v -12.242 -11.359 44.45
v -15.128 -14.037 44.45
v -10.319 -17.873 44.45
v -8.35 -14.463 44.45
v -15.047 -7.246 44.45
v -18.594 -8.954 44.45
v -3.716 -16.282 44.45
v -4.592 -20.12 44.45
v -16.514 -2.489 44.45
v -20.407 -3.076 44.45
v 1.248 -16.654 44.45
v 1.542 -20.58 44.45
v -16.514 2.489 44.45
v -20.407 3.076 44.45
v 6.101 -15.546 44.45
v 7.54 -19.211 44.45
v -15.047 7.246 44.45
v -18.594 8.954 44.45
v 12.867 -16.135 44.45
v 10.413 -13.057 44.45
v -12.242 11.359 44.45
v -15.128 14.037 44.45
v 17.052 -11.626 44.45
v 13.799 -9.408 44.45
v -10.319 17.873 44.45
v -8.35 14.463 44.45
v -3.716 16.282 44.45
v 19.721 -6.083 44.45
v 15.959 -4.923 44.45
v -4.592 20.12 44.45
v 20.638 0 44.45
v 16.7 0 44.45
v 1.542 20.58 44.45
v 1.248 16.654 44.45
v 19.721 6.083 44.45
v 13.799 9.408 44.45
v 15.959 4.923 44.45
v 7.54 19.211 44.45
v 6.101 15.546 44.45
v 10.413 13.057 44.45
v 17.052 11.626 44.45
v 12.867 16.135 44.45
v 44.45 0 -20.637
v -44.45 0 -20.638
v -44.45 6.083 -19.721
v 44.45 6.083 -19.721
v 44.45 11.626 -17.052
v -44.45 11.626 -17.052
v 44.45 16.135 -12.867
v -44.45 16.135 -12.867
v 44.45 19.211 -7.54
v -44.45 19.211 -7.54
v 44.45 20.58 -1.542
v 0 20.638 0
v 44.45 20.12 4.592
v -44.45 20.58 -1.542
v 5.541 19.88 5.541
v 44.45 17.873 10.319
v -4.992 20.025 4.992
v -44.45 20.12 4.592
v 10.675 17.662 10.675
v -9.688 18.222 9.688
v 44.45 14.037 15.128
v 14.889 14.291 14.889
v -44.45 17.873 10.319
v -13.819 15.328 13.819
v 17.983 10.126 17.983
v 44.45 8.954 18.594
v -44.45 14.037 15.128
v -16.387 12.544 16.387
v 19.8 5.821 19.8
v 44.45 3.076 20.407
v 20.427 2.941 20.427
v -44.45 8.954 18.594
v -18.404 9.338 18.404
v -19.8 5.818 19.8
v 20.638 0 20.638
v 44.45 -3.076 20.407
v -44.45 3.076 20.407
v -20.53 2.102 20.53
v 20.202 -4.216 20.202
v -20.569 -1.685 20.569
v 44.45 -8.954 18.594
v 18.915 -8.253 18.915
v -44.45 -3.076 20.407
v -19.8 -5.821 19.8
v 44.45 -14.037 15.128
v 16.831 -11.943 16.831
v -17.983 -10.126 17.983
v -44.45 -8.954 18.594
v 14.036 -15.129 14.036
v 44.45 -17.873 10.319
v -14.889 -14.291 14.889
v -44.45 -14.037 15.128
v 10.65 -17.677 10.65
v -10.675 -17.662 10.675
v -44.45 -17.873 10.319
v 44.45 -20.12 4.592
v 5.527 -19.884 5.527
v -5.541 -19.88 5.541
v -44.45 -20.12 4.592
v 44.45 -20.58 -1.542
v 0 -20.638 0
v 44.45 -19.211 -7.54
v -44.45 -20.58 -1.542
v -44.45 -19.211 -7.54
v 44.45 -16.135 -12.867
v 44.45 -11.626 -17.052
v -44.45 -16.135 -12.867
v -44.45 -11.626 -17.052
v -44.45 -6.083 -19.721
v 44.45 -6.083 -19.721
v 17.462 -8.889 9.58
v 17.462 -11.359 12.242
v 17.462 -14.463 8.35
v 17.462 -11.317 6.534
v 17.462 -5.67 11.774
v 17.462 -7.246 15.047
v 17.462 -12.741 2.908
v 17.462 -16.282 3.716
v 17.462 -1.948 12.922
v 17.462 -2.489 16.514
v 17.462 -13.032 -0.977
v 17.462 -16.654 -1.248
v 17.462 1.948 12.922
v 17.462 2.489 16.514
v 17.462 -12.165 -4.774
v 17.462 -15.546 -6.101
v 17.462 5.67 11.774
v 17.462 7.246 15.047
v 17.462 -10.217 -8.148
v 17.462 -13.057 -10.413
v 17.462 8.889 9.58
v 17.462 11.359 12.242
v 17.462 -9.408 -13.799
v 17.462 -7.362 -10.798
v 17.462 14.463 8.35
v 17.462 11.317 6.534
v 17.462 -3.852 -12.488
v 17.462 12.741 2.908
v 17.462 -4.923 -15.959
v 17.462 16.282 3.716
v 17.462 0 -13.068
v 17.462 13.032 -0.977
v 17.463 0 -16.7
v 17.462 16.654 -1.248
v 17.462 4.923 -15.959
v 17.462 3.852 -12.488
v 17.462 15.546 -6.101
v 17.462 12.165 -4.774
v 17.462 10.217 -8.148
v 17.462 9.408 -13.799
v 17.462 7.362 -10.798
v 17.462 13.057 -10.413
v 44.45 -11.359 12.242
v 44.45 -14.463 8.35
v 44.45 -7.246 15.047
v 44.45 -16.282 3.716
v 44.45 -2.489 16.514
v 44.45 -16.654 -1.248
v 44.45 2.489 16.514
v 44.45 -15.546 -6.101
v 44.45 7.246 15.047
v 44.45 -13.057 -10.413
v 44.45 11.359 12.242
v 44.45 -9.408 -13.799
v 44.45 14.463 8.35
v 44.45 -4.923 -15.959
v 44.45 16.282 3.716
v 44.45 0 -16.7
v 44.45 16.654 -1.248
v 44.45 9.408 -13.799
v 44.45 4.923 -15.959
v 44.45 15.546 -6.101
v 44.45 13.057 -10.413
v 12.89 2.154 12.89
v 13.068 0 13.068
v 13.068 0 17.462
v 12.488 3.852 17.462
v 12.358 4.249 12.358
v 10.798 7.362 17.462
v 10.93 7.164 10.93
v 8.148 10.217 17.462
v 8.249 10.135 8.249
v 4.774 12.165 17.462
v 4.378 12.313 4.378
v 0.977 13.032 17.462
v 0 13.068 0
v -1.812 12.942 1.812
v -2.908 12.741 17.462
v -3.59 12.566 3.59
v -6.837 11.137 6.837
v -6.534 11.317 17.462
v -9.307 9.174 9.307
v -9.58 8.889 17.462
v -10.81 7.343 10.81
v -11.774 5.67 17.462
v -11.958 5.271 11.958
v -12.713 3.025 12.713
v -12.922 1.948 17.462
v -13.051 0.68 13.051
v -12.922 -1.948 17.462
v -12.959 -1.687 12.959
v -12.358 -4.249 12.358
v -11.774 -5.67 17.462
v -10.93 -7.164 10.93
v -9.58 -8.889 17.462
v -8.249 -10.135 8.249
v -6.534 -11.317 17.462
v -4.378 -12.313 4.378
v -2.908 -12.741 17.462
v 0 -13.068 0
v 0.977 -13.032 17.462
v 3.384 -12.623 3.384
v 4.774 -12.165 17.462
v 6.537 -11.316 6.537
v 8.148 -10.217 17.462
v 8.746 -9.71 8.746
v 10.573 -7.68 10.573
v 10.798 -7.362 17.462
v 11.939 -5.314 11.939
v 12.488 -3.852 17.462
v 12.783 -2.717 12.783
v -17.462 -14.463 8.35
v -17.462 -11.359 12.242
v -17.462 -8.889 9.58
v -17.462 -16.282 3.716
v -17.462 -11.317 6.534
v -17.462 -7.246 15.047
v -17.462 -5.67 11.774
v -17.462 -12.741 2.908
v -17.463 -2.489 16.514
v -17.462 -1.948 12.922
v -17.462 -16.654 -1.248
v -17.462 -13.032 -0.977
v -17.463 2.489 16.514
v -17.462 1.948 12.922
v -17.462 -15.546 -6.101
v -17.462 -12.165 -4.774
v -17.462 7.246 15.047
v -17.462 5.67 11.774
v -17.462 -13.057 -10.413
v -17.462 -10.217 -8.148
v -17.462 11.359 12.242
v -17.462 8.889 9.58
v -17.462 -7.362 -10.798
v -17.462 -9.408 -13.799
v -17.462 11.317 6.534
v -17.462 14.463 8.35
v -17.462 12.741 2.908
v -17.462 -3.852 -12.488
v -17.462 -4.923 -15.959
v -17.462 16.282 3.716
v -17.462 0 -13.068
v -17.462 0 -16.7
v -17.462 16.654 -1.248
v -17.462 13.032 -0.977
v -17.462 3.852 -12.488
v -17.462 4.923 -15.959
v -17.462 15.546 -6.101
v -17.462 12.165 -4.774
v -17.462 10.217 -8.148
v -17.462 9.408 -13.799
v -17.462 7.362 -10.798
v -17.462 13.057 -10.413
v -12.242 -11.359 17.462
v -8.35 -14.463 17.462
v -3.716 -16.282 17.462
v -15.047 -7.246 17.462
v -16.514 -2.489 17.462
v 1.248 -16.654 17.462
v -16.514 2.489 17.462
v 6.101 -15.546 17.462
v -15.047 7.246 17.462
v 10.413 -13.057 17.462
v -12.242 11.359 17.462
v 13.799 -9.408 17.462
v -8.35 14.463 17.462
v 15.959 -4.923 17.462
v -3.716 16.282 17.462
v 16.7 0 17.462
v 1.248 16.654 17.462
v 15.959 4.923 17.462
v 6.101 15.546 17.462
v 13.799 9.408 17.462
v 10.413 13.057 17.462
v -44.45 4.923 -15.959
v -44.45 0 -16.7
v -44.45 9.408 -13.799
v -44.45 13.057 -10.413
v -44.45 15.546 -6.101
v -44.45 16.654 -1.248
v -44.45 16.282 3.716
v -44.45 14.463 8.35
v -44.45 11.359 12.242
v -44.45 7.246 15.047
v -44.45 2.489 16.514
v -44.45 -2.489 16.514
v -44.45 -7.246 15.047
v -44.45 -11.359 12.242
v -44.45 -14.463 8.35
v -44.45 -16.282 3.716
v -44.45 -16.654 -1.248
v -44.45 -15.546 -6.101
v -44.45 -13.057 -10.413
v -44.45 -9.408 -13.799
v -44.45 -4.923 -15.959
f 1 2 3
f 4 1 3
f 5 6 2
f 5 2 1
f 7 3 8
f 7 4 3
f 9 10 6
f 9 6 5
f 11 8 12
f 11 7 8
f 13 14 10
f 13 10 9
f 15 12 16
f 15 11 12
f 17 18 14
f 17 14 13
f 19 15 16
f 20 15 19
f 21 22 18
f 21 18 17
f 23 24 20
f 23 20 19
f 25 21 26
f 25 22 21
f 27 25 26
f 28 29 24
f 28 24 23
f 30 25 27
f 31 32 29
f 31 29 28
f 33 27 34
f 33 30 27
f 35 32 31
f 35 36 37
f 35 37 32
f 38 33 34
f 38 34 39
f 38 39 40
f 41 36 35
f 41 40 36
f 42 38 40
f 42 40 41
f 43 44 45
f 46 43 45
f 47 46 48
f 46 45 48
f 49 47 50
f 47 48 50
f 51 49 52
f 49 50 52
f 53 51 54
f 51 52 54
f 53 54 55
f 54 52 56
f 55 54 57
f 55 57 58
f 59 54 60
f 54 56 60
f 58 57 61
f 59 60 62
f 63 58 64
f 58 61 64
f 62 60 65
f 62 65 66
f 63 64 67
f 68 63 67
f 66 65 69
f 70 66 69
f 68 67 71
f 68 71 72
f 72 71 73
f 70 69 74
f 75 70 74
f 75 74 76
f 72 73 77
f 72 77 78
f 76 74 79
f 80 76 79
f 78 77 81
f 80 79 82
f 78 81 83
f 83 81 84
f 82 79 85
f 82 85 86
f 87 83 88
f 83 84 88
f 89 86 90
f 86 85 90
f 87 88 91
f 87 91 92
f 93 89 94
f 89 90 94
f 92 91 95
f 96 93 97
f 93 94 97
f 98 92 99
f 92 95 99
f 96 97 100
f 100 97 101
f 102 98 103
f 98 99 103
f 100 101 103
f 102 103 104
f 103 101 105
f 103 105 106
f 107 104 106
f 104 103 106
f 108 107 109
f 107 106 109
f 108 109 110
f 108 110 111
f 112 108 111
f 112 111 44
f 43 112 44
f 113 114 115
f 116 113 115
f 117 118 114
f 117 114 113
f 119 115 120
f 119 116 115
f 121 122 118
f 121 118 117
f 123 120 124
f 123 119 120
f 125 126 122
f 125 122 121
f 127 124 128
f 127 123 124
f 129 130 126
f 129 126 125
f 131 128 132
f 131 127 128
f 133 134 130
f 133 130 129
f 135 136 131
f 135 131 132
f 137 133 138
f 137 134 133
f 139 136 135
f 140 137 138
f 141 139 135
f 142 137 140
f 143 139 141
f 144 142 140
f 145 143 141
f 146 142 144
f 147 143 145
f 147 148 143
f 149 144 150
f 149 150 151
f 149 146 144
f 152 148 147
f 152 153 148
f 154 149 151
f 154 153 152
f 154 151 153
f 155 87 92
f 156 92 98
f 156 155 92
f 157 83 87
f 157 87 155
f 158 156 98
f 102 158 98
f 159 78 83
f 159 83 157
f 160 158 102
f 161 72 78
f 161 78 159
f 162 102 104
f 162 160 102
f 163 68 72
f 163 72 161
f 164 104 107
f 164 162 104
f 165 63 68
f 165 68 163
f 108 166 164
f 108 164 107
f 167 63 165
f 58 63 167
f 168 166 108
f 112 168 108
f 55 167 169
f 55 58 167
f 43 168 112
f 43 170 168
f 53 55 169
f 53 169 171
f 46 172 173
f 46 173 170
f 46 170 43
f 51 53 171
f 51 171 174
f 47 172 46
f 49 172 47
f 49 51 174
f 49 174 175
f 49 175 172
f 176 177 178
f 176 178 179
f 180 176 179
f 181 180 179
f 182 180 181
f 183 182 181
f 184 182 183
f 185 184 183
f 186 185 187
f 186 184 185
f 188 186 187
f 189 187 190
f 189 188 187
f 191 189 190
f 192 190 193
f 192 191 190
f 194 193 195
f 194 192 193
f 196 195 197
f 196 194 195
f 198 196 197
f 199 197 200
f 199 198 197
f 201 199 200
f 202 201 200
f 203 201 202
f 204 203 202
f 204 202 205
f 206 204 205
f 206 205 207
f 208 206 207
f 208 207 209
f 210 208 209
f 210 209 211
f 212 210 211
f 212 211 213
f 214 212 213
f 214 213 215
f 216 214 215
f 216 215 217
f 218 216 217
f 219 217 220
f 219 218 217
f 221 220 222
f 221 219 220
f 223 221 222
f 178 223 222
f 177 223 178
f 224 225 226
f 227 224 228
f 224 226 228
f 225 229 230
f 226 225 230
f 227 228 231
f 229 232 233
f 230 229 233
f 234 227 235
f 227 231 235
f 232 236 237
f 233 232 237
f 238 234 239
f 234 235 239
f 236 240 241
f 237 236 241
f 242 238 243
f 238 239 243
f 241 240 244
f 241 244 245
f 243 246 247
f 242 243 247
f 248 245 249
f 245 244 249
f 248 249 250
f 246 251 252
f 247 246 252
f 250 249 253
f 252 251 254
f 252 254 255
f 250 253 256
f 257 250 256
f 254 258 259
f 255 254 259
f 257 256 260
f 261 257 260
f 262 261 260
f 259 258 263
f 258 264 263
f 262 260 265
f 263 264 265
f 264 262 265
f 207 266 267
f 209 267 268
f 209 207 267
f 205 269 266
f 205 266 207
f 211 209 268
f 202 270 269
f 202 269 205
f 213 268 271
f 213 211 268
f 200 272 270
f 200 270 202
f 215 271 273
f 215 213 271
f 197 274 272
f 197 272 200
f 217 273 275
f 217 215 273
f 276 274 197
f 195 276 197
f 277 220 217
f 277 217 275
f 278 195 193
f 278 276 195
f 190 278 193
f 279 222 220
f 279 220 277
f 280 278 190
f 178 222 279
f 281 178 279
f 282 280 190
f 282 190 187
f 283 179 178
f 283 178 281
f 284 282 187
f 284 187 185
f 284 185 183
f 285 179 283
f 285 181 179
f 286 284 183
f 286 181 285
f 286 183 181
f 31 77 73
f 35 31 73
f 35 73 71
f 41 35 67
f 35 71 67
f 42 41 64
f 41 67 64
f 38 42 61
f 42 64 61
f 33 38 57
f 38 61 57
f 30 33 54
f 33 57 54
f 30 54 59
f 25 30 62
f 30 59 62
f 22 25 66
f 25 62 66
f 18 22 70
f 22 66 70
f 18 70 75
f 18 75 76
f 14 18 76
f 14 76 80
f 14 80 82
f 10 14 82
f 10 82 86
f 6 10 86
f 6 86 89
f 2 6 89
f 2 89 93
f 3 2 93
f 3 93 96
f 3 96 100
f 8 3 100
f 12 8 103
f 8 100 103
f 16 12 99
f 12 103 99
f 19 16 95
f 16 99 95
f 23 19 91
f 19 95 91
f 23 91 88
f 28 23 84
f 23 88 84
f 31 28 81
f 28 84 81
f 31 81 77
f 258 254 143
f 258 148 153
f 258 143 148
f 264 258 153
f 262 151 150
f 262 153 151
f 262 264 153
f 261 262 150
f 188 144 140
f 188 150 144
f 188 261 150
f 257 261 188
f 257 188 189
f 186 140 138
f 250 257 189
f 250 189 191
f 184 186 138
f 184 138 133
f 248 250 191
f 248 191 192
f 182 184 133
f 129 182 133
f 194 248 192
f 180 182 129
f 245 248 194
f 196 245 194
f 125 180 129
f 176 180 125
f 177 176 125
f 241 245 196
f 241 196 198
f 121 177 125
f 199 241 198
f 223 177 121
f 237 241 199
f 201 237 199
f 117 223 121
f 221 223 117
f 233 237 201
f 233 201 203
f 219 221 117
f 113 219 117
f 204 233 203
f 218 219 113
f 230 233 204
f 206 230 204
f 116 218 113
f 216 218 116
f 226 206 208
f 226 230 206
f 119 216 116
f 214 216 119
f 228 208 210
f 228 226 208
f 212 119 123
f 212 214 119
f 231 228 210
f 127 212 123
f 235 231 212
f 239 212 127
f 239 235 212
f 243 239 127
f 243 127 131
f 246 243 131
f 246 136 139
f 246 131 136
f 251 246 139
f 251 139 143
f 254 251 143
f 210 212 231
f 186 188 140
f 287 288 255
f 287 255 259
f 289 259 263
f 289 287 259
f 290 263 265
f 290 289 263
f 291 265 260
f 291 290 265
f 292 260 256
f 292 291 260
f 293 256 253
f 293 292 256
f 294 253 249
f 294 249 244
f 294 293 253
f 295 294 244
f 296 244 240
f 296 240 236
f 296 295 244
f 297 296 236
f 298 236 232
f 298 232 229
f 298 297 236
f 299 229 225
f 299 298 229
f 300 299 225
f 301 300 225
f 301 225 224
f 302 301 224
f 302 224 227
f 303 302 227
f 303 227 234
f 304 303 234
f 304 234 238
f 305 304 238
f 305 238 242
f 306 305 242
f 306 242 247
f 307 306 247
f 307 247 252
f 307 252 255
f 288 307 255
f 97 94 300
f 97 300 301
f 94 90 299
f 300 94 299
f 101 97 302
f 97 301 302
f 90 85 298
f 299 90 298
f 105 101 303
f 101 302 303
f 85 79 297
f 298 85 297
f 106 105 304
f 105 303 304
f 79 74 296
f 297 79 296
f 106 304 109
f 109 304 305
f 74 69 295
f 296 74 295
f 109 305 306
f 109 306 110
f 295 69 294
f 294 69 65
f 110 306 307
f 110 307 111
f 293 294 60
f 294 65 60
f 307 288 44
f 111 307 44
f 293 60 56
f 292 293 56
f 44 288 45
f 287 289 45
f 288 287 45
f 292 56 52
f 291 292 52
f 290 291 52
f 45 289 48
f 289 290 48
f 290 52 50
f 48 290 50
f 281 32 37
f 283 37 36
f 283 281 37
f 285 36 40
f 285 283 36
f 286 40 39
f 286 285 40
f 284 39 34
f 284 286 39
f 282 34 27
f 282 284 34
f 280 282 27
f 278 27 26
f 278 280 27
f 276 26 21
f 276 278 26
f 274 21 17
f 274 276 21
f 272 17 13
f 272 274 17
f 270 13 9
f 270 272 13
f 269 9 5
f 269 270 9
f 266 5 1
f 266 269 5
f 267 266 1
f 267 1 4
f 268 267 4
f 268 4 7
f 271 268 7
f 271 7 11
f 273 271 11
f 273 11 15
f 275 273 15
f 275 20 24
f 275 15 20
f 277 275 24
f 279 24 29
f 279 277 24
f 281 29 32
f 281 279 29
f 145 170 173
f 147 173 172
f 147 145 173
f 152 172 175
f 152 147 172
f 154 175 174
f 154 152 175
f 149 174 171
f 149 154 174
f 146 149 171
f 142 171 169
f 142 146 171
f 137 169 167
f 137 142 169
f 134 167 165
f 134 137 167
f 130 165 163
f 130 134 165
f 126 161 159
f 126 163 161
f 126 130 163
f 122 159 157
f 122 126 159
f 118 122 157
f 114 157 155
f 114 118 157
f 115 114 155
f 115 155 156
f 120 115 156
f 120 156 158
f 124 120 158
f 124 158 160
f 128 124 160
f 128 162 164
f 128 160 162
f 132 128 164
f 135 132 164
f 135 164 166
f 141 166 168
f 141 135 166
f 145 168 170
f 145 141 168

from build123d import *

# Parameters (mm, degrees)
SOCKETRIGHT_R                       = 16.7005
SOCKETRIGHT_DEPTH                   = 29.68625
SOCKETRIGHT_PITCH_ANGLE             = 90
SOCKETTOP_R                         = 16.7005
SOCKETTOP_DEPTH                     = 29.68625
SOCKETLEFT_R                        = 16.7005
SOCKETLEFT_DEPTH                    = 29.68625
SOCKETLEFT_PITCH_ANGLE              = 90
HORIZONTALINNERCYNLIDER_R           = 13.0683
HORIZONTALINNERCYNLIDER_DEPTH       = 97.79
HORIZONTALINNERCYNLIDER_PITCH_ANGLE = 90
VERTICALINNERCYNLIDER_R             = 13.0683
VERTICALINNERCYNLIDER_DEPTH         = 48.895
HORIZONTALOUTERCYNLIDER_R           = 20.6375
HORIZONTALOUTERCYNLIDER_DEPTH       = 88.9
HORIZONTALOUTERCYNLIDER_PITCH_ANGLE = 90
VERTICALOUTERCYNLIDER_R             = 20.6375
VERTICALOUTERCYNLIDER_DEPTH         = 44.45


with BuildPart() as socketright:
    # SocketRight → SocketRight (new body)
    with BuildSketch(Plane.XY):
        Circle(SOCKETRIGHT_R)
    extrude(amount=SOCKETRIGHT_DEPTH)


with BuildPart() as socketright_1:
    # SocketRight pitch: moved
    add(socketright.part.rotate(Axis((0, 0, 0), (0, 1, 0)), SOCKETRIGHT_PITCH_ANGLE))


with BuildPart() as socketright_2:
    # SocketRight placement: moved
    add(socketright_1.part.moved(Location((17.4625, 0, 0))))


with BuildPart() as sockettop:
    # SocketTop → SocketTop (new body)
    with BuildSketch(Plane.XY.offset(17.4625)):
        Circle(SOCKETTOP_R)
    extrude(amount=SOCKETTOP_DEPTH)


with BuildPart() as sockets:
    # SocketLeft → SocketLeft (new body)
    with BuildSketch(Plane.XY):
        Circle(SOCKETLEFT_R)
    extrude(amount=SOCKETLEFT_DEPTH)


with BuildPart() as sockets_1:
    # SocketLeft pitch: moved
    add(sockets.part.rotate(Axis((0, 0, 0), (0, 1, 0)), SOCKETLEFT_PITCH_ANGLE))


with BuildPart() as sockets_2:
    # SocketLeft placement: moved
    add(sockets_1.part.moved(Location((-47.14875, 0, 0))))

    # Sockets: union SocketRight, SocketTop
    add(socketright_2.part)
    add(sockettop.part)


with BuildPart() as horizontalinnercynlider:
    # HorizontalInnerCynlider → HorizontalInnerCynlider (new body)
    with BuildSketch(Plane.XY):
        Circle(HORIZONTALINNERCYNLIDER_R)
    extrude(amount=HORIZONTALINNERCYNLIDER_DEPTH)


with BuildPart() as horizontalinnercynlider_1:
    # HorizontalInnerCynlider pitch: moved
    add(horizontalinnercynlider.part.rotate(Axis((0, 0, 0), (0, 1, 0)), HORIZONTALINNERCYNLIDER_PITCH_ANGLE))


with BuildPart() as horizontalinnercynlider_2:
    # HorizontalInnerCynlider placement: moved
    add(horizontalinnercynlider_1.part.moved(Location((-48.895, 0, 0))))


with BuildPart() as innerteefusion:
    # VerticalInnerCynlider → VerticalInnerCynlider (new body)
    with BuildSketch(Plane.XY):
        Circle(VERTICALINNERCYNLIDER_R)
    extrude(amount=VERTICALINNERCYNLIDER_DEPTH)

    # InnerTeeFusion: union HorizontalInnerCynlider
    add(horizontalinnercynlider_2.part)


with BuildPart() as horizontaloutercynlider:
    # HorizontalOuterCynlider → HorizontalOuterCynlider (new body)
    with BuildSketch(Plane.XY):
        Circle(HORIZONTALOUTERCYNLIDER_R)
    extrude(amount=HORIZONTALOUTERCYNLIDER_DEPTH)


with BuildPart() as horizontaloutercynlider_1:
    # HorizontalOuterCynlider pitch: moved
    add(horizontaloutercynlider.part.rotate(Axis((0, 0, 0), (0, 1, 0)), HORIZONTALOUTERCYNLIDER_PITCH_ANGLE))


with BuildPart() as horizontaloutercynlider_2:
    # HorizontalOuterCynlider placement: moved
    add(horizontaloutercynlider_1.part.moved(Location((-44.45, 0, 0))))


with BuildPart() as tee:
    # VerticalOuterCynlider → VerticalOuterCynlider (new body)
    with BuildSketch(Plane.XY):
        Circle(VERTICALOUTERCYNLIDER_R)
    extrude(amount=VERTICALOUTERCYNLIDER_DEPTH)

    # OuterTeeFusion: union HorizontalOuterCynlider
    add(horizontaloutercynlider_2.part)

    # Cut: cut InnerTeeFusion
    add(innerteefusion.part, mode=Mode.SUBTRACT)

    # Tee: cut Sockets
    add(sockets_2.part, mode=Mode.SUBTRACT)


solid = tee.part
